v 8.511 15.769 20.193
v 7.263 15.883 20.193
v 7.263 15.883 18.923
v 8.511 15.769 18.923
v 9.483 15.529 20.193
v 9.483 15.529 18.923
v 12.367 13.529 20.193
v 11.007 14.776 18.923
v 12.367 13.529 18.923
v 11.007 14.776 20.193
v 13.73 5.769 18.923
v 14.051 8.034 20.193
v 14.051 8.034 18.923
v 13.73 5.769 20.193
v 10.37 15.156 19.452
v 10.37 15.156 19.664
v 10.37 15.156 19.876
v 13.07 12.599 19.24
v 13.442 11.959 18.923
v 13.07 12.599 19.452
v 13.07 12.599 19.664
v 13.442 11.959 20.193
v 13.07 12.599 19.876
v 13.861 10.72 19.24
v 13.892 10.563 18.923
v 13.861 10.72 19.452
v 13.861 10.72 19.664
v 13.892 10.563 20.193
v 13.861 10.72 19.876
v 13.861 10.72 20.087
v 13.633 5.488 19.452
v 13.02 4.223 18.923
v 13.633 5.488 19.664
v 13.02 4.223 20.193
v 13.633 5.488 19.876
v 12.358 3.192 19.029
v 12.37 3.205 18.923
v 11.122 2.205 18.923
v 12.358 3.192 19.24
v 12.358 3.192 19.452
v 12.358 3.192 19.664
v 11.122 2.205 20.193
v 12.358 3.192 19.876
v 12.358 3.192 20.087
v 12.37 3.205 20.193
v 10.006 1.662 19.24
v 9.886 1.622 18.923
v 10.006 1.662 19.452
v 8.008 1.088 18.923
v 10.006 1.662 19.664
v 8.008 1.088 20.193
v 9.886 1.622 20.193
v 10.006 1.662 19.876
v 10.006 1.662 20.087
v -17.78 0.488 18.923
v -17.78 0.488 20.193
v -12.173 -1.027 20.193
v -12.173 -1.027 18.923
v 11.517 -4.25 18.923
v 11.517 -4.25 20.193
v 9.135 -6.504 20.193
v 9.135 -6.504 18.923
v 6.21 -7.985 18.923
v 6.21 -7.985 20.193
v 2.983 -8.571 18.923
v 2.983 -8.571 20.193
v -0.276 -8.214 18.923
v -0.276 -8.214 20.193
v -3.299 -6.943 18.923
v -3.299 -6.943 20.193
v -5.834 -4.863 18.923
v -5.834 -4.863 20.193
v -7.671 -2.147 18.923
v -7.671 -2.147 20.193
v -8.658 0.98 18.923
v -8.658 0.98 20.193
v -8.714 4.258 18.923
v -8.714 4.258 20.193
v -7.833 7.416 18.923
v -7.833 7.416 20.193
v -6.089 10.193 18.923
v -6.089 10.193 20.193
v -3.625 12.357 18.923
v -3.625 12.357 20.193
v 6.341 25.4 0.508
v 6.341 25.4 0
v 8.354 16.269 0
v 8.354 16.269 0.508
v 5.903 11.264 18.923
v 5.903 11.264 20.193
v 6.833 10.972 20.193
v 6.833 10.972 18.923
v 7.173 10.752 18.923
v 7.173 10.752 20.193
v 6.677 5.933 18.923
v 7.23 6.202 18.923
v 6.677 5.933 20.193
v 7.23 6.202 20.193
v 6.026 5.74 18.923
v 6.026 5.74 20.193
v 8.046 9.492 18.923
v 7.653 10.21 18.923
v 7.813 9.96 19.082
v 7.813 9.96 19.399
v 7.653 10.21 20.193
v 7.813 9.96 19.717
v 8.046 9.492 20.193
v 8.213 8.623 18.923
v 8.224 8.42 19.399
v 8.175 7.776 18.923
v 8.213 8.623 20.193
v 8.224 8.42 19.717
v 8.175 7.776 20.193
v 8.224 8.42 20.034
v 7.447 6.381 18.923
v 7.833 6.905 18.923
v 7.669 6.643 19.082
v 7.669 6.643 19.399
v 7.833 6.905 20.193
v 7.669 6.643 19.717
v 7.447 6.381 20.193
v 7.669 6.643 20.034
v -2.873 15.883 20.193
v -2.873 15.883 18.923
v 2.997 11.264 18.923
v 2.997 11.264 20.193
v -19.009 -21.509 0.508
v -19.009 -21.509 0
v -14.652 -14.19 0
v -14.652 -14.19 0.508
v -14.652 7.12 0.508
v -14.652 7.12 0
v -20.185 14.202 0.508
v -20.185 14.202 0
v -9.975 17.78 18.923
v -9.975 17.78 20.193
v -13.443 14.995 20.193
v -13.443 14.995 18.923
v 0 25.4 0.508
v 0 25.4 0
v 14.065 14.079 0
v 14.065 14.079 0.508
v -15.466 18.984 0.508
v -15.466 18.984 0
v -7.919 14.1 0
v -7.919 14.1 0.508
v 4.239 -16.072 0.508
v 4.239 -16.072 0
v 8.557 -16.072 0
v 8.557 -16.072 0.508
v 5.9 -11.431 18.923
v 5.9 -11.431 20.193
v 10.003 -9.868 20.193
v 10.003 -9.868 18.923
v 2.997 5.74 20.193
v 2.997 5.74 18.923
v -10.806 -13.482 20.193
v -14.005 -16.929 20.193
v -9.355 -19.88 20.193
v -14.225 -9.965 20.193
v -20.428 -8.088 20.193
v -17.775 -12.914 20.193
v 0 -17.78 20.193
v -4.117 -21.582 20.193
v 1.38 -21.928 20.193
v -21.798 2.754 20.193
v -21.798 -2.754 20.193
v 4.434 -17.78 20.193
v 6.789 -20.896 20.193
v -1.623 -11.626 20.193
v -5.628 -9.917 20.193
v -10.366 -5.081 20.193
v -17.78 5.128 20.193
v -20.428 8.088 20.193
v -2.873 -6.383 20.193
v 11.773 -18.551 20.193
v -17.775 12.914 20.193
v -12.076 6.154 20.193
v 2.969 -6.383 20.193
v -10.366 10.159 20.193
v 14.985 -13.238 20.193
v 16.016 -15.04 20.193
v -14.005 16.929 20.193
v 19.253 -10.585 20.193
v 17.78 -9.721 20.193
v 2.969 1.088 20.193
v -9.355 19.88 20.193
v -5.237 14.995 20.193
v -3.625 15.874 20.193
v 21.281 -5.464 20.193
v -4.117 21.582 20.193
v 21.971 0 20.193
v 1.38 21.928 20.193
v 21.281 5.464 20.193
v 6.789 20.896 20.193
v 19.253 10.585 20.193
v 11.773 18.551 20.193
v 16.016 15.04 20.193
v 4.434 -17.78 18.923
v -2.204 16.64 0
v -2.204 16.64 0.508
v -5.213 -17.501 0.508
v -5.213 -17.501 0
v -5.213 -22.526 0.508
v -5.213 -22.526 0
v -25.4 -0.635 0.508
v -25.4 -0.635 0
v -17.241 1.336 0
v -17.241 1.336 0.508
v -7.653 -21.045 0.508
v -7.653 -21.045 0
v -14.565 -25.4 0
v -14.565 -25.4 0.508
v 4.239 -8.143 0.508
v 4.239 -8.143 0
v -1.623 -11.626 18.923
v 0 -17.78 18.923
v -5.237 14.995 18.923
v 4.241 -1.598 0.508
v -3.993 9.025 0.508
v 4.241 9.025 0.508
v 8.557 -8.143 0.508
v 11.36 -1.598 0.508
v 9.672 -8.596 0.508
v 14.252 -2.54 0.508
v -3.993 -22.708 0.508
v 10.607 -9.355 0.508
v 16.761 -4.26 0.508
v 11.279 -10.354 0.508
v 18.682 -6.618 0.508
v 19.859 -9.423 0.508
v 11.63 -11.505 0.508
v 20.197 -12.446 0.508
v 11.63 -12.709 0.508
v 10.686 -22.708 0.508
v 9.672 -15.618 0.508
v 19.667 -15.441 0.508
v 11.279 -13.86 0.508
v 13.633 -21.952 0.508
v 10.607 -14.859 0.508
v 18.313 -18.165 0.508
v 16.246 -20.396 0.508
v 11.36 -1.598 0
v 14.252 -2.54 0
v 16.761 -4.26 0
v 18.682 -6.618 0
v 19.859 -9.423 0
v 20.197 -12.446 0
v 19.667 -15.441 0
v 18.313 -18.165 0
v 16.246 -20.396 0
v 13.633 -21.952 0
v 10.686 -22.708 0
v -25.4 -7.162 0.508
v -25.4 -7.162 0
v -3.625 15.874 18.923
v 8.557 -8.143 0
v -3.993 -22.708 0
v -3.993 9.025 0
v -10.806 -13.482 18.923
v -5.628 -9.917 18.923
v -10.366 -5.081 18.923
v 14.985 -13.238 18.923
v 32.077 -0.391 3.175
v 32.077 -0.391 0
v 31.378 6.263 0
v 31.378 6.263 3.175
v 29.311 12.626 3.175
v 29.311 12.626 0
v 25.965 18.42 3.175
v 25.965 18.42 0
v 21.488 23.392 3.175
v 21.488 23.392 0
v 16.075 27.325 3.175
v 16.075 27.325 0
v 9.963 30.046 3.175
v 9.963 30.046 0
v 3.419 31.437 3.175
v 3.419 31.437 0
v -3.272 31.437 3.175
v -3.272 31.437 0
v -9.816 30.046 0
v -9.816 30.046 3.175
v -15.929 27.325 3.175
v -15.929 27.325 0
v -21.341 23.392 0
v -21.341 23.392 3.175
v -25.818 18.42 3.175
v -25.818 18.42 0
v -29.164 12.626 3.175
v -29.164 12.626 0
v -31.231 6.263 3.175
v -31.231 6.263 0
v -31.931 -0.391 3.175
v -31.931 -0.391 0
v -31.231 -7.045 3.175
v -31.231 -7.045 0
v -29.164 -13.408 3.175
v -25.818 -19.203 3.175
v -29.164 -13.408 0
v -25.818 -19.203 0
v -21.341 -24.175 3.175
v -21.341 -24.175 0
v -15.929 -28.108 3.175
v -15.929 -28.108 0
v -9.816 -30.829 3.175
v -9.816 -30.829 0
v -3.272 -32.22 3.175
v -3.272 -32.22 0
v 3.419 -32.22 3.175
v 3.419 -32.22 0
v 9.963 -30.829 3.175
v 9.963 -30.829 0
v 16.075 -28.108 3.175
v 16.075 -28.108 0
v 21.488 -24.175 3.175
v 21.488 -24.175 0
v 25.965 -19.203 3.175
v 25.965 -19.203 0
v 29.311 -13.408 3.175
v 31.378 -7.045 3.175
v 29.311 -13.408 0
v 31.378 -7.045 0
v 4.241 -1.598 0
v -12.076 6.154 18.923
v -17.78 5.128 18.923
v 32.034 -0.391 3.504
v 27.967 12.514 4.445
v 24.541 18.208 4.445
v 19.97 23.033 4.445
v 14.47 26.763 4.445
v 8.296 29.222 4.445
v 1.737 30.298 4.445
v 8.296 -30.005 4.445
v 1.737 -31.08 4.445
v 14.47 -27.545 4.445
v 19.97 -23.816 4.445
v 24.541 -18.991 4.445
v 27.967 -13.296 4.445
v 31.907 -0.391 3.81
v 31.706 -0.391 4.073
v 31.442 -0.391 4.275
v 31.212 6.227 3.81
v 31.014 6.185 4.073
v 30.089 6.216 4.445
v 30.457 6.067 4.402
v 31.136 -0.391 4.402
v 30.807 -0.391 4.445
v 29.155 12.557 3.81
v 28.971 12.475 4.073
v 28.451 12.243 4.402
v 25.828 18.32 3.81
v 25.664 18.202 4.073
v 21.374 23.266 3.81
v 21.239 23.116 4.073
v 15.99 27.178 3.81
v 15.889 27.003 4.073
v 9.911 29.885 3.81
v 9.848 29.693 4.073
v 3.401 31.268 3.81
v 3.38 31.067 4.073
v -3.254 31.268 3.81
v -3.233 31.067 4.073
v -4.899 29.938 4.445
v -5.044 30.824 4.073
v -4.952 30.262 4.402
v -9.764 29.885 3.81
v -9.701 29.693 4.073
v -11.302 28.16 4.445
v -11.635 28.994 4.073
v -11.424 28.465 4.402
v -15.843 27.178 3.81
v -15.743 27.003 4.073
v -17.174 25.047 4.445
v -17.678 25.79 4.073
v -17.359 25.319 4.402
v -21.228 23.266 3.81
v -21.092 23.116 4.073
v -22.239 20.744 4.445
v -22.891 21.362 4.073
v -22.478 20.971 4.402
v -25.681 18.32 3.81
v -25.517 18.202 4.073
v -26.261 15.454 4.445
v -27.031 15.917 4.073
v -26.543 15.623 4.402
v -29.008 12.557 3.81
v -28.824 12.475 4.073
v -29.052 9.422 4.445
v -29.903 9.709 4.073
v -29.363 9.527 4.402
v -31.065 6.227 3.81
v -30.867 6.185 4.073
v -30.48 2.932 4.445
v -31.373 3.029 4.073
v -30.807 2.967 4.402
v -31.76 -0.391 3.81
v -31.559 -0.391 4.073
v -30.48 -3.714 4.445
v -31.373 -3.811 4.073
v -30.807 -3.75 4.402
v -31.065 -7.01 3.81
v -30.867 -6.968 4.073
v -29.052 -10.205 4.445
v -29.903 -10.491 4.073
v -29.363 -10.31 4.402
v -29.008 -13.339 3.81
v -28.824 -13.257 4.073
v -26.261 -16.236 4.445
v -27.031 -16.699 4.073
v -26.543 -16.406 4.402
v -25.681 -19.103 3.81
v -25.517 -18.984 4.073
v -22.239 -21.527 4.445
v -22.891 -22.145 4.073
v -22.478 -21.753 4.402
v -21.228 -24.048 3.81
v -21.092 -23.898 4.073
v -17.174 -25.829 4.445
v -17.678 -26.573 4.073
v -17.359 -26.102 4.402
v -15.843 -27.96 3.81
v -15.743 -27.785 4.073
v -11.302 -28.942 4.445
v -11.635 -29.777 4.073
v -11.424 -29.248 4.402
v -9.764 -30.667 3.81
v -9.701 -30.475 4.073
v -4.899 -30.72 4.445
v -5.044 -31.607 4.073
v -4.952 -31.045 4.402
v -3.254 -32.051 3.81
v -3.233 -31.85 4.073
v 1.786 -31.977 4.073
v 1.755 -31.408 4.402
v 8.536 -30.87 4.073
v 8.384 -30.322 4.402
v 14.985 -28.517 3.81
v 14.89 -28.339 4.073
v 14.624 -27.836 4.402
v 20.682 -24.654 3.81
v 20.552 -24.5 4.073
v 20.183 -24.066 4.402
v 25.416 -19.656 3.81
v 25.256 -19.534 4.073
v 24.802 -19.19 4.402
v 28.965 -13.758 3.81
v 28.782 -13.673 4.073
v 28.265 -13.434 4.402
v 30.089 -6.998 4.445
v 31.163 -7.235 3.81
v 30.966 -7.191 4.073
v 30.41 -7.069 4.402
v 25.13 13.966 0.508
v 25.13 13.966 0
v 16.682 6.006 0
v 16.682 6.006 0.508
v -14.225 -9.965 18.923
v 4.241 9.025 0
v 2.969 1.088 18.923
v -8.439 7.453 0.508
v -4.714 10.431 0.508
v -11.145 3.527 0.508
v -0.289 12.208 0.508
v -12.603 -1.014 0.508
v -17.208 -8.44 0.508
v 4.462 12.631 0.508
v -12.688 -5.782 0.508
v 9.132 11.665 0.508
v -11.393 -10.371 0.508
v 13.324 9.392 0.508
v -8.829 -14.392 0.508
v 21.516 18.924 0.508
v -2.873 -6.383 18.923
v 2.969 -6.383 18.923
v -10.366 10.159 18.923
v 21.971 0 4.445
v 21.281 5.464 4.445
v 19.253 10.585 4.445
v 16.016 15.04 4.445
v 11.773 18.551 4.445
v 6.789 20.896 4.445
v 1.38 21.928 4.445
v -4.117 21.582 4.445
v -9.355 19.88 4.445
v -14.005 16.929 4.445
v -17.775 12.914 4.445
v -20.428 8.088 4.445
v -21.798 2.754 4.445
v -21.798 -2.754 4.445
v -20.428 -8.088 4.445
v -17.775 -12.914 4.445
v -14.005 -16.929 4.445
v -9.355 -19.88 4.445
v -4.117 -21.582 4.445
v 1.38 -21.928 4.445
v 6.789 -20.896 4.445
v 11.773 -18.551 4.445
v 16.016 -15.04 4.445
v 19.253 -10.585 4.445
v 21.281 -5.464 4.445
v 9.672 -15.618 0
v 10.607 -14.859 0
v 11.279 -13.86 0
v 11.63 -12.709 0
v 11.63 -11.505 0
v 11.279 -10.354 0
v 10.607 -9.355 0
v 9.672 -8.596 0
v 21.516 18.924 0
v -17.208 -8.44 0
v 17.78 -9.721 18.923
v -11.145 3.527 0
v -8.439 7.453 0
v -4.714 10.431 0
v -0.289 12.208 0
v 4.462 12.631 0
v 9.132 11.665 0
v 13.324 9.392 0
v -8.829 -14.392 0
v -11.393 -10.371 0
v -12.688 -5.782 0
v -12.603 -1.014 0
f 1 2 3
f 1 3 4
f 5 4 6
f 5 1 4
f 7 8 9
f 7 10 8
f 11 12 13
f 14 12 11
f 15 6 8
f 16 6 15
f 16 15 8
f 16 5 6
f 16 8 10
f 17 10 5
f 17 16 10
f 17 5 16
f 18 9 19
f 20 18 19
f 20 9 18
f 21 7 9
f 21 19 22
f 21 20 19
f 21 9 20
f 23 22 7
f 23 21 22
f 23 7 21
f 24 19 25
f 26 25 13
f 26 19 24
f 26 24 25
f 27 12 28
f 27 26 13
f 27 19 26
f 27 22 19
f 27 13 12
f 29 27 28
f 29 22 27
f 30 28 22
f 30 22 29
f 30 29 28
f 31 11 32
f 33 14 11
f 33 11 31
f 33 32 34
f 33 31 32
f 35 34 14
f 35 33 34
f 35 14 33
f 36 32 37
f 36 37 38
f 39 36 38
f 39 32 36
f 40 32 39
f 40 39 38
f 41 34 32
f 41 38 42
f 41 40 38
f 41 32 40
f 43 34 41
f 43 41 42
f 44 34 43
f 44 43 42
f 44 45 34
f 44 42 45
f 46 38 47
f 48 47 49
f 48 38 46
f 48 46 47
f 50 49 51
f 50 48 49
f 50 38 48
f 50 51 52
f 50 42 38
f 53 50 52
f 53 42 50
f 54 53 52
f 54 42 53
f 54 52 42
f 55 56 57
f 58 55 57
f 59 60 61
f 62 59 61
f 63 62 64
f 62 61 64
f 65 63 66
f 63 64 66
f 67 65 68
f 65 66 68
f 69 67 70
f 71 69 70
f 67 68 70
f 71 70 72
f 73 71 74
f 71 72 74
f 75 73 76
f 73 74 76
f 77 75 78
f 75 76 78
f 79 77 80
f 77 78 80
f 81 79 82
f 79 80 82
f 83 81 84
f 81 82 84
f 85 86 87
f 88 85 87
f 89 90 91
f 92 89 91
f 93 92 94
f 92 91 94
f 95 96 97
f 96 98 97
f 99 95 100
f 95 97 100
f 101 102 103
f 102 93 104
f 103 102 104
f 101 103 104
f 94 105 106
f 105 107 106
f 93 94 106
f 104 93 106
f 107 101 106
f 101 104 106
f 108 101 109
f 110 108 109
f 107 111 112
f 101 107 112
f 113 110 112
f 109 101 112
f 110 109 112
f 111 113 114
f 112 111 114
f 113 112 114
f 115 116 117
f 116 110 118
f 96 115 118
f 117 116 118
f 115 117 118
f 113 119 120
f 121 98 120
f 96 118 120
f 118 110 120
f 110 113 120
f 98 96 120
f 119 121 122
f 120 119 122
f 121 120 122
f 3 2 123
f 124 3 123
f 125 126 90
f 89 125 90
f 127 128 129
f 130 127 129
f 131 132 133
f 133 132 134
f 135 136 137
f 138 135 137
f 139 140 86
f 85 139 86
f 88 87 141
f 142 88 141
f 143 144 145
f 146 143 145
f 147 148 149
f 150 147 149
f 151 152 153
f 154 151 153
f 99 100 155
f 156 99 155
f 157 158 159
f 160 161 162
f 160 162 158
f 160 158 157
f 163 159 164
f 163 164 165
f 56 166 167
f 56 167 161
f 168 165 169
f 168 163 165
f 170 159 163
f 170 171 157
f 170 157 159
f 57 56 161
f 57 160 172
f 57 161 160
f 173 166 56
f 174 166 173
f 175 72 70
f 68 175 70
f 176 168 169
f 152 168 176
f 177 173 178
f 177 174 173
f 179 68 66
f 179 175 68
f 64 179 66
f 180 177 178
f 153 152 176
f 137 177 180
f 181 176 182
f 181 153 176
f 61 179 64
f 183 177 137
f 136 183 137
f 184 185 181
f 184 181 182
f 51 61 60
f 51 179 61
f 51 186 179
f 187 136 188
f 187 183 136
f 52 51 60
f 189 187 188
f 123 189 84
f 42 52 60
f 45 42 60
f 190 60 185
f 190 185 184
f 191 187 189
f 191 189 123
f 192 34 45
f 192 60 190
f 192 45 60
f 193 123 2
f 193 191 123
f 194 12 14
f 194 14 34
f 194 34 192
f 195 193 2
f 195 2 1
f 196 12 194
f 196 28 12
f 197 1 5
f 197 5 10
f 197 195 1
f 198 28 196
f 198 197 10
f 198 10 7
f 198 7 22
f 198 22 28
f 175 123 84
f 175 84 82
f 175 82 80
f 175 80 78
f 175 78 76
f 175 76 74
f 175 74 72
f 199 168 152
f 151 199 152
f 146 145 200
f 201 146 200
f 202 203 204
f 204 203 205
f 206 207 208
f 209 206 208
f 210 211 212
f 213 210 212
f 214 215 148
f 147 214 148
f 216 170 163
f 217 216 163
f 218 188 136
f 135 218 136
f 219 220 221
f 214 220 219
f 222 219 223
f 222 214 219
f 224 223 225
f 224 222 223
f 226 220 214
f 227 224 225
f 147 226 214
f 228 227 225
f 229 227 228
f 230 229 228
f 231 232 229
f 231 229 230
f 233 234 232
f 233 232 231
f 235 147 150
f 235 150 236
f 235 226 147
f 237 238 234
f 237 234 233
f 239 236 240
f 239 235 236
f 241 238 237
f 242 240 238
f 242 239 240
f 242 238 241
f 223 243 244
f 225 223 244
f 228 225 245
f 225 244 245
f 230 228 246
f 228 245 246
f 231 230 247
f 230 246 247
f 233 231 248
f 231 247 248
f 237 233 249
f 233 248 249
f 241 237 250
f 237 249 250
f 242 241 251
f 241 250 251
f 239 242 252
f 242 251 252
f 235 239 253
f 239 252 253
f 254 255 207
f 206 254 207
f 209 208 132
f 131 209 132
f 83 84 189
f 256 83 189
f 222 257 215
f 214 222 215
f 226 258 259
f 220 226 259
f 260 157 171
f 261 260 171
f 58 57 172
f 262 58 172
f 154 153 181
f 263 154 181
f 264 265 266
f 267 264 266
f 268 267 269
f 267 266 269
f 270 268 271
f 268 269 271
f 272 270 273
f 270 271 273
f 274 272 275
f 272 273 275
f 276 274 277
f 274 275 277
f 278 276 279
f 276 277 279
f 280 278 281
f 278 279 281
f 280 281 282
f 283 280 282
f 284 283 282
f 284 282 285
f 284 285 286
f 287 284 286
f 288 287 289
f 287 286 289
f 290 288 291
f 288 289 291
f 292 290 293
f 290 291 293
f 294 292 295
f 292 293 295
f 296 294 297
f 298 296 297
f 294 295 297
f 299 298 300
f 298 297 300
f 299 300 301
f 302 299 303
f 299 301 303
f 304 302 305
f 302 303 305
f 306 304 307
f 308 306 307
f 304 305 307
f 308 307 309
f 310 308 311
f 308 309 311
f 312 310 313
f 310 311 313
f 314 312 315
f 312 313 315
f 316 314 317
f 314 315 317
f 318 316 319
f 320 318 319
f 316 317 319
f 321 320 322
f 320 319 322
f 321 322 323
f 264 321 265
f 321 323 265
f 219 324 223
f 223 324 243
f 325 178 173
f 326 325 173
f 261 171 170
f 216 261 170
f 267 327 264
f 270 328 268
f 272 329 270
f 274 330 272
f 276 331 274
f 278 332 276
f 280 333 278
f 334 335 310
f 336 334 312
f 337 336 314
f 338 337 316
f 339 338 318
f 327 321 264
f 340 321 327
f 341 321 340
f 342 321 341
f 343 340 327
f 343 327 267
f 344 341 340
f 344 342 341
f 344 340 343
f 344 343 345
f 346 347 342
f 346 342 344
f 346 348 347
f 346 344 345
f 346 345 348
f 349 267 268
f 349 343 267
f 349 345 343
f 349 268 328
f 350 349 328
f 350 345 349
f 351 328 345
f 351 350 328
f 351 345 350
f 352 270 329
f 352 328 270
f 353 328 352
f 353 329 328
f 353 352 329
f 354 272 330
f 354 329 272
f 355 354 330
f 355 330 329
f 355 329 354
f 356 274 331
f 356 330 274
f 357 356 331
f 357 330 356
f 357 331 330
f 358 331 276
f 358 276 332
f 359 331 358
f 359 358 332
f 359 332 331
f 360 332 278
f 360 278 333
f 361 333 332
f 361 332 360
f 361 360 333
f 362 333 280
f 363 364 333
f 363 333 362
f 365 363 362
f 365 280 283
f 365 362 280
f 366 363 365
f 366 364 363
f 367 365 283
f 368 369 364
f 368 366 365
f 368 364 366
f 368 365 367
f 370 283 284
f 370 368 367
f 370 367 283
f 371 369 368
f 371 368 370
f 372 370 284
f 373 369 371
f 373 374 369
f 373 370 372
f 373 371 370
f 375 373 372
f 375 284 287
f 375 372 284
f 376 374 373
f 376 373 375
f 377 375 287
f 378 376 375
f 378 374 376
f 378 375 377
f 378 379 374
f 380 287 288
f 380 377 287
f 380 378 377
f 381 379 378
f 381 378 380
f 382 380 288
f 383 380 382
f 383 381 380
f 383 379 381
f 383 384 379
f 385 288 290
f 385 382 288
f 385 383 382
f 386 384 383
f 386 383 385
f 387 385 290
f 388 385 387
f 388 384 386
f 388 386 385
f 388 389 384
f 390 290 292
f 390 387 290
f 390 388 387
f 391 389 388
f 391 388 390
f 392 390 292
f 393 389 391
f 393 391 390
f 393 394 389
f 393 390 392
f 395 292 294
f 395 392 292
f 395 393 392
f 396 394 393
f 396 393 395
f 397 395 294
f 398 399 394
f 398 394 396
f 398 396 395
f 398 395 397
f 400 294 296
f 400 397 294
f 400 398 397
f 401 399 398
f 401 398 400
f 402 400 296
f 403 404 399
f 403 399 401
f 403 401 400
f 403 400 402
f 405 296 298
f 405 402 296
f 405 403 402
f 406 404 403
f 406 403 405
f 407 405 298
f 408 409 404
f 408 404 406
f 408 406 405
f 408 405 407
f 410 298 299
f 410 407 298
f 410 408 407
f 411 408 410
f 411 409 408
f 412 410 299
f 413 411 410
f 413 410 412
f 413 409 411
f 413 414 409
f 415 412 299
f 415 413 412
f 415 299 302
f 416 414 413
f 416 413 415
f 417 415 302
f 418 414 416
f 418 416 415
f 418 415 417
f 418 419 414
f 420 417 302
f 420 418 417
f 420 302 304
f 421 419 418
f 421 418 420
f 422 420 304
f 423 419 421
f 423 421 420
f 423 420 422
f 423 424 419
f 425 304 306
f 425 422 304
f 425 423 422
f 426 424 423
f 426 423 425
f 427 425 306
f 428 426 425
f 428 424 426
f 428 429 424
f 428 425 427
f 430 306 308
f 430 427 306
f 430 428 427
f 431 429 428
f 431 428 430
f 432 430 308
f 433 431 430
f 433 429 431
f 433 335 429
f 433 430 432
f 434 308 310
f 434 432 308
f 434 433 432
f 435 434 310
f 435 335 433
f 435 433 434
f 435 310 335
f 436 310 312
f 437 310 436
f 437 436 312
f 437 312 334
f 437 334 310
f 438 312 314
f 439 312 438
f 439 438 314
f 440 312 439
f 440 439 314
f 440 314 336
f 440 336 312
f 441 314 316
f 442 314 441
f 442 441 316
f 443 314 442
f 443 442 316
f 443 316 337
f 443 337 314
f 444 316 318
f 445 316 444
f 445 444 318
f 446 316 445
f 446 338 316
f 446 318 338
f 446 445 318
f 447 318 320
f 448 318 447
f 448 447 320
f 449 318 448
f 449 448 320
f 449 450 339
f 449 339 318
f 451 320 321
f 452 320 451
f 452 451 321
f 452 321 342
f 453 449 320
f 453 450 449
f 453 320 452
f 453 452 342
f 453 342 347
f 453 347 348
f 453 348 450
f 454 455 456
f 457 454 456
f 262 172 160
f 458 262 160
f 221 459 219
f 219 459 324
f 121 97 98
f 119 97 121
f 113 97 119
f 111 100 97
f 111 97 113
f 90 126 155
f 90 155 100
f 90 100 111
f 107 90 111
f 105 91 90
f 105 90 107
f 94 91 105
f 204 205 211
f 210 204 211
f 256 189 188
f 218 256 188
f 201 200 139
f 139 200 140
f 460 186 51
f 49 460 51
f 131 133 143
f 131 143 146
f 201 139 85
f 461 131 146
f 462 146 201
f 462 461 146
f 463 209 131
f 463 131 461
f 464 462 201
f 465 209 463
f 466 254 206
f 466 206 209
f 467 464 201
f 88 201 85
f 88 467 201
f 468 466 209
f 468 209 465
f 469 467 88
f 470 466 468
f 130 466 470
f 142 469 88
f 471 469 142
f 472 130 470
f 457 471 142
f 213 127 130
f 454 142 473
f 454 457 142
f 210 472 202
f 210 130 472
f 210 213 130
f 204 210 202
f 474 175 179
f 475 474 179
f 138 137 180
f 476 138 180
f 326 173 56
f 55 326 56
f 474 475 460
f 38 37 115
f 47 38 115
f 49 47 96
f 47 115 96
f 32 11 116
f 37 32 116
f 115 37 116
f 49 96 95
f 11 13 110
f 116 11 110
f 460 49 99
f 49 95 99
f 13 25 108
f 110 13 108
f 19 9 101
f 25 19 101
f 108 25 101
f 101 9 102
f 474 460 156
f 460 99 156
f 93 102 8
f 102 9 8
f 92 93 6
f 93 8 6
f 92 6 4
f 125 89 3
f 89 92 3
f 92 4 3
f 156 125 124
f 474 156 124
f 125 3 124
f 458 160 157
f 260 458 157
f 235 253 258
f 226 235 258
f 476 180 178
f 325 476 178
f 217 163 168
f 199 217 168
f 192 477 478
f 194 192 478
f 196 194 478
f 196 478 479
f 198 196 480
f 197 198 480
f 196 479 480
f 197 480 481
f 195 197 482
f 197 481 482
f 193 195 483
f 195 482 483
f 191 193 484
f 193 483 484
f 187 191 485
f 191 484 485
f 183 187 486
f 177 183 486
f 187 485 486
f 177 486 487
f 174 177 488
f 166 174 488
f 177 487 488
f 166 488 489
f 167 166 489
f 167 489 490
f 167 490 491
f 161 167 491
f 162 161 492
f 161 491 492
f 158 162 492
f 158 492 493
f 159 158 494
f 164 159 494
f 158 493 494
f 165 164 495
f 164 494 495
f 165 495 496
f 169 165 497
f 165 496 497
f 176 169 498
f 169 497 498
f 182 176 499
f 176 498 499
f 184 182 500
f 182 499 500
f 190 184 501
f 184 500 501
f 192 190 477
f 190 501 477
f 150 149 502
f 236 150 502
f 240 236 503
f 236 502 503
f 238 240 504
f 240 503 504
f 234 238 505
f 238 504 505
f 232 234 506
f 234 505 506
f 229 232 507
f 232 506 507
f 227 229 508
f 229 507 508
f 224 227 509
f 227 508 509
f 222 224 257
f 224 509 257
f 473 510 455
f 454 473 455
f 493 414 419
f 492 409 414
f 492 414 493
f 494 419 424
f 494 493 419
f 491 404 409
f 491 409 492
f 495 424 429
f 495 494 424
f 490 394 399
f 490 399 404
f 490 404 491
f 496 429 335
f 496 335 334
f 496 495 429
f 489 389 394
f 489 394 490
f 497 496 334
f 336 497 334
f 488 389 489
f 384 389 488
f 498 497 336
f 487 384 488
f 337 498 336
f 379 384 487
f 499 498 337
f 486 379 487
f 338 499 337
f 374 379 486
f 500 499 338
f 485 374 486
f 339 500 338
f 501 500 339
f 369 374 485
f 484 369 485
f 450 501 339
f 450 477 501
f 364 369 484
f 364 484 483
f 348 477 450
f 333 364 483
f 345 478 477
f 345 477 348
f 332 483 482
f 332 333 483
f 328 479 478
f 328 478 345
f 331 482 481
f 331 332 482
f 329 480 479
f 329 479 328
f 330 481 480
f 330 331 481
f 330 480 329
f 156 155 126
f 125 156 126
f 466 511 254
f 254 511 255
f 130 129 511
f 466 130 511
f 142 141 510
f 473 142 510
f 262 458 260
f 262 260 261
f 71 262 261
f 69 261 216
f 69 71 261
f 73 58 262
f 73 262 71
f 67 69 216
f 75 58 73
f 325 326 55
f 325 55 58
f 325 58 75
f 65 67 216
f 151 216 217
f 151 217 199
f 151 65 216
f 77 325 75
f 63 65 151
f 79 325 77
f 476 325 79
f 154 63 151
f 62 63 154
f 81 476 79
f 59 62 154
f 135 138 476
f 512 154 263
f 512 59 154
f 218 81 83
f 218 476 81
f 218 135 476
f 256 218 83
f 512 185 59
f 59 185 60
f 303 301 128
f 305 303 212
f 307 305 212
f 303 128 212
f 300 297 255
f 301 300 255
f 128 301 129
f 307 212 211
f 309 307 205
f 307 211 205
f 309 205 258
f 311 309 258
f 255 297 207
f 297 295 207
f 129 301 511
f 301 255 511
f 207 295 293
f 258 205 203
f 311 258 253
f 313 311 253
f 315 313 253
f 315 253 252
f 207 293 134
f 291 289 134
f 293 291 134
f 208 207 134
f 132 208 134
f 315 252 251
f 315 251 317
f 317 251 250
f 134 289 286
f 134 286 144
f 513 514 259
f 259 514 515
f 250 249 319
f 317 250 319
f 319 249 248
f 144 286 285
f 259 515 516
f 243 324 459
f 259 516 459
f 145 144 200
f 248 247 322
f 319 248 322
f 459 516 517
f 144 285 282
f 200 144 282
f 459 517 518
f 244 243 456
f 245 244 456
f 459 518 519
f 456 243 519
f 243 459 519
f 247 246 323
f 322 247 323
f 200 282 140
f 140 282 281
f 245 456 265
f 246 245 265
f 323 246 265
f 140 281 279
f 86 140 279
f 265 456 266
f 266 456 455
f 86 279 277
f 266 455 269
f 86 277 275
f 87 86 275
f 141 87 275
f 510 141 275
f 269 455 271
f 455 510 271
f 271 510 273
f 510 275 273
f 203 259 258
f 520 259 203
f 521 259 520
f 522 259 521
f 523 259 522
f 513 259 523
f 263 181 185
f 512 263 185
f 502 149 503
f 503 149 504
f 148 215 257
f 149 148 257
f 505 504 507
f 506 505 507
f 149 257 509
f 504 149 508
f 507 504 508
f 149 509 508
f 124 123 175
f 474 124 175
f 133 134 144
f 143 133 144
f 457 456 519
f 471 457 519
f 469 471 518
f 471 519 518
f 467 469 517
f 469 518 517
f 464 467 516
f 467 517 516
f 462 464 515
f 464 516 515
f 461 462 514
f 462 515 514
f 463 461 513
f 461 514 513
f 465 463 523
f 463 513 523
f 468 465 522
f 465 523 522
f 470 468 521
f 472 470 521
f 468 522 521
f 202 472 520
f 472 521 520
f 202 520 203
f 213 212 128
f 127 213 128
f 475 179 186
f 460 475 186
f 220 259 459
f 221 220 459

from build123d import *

# Parameters (mm, degrees)
F0_R     = 32.004
F1_DEPTH = 4.445
F2_R     = 21.971
F3_DEPTH = 15.748
F4_R     = 1.27
F6_DEPTH = 1.27
F8_DEPTH = 0.508


with BuildPart() as f1:
    # F0 (on Top) → F1 (new body)
    with BuildSketch(Plane.XY):
        with Locations((0.0734815403, -0.3912560351)):
            Circle(F0_R)
    extrude(amount=F1_DEPTH)

    # F2 (on face) → F3 (join)
    with BuildSketch(Plane.XY.offset(4.445)):
        Circle(F2_R)
    extrude(amount=F3_DEPTH)

    # F4
    f4_edges = [f1.edges().sort_by_distance(p)[0] for p in [
        (-31.930518, -0.391256, 4.445),
    ]]
    fillet(f4_edges, radius=F4_R)

    # F5 (on face) → F6 (cut)
    with BuildSketch(Plane.XY.offset(20.193)):
        with BuildLine():
            ThreePointArc((11.5169007331, -4.2504528537), (-5.8335664103, -4.8630391768), (-3.625406418, 12.3572396114))
            Line((-3.625406418, 12.3572396114), (-3.625406418, 15.8741623163))
            Line((-3.625406418, 15.8741623163), (-5.2373292856, 14.9949323386))
            Line((-5.2373292856, 14.9949323386), (-9.9754063413, 17.78))
            Line((-9.9754063413, 17.78), (-13.4434830397, 14.9949323386))
            Line((-13.4434830397, 14.9949323386), (-10.3661753237, 10.1591628045))
            Line((-10.3661753237, 10.1591628045), (-12.0757911354, 6.153778173))
            Line((-12.0757911354, 6.153778173), (-17.78, 5.1280092448))
            Line((-17.78, 5.1280092448), (-17.78, 0.4876240855))
            Line((-17.78, 0.4876240855), (-12.1734831482, -1.0266067693))
            Line((-12.1734831482, -1.0266067693), (-10.3661753237, -5.0808377564))
            Line((-10.3661753237, -5.0808377564), (-14.225021936, -9.9654532969))
            Line((-14.225021936, -9.9654532969), (-10.8057912439, -13.4823769331))
            Line((-10.8057912439, -13.4823769331), (-5.6280987337, -9.9166072905))
            Line((-5.6280987337, -9.9166072905), (-1.6227141023, -11.6262231022))
            Line((-1.6227141023, -11.6262231022), (0, -17.78))
            Line((0, -17.78), (4.4342088513, -17.78))
            Line((4.4342088513, -17.78), (5.8995936997, -11.4308381453))
            Line((5.8995936997, -11.4308381453), (10.0026708096, -9.8677603528))
            Line((10.0026708096, -9.8677603528), (14.9849783629, -13.2381459698))
            Line((14.9849783629, -13.2381459698), (17.78, -9.7212223336))
            Line((17.78, -9.7212223336), (11.5169007331, -4.2504528537))
        make_face()
        with BuildLine():
            add(Edge.make_bspline(
                [(7.2628180496, 15.8830489963), (7.764120513, 15.8547054313), (8.7931376229, 15.7965249604), (10.4249300167, 15.2148196487), (11.8099126054, 14.2323930058), (13.1704291206, 12.5947806565), (14.0438131033, 10.7817202185), (14.1201673867, 7.3393260802), (13.7194691328, 5.5139226252), (13.0765966002, 4.3745110609), (12.4961633849, 3.1101795931), (10.8585799754, 2.0034232369), (10.0201954446, 1.6327368317), (8.7603057074, 1.291574238), (8.0080404878, 1.0878700996)],
                knots=[0, 0, 0, 0, 0.0772193353, 0.1585071351, 0.2400871058, 0.3296102404, 0.4189216979, 0.5342087706, 0.6199032215, 0.6892989221, 0.7632939871, 0.8489473746, 0.9098082689, 1, 1, 1, 1], degree=3))
            Line((7.2628180496, 15.8830489963), (-2.8727587778, 15.8830489963))
            Line((-2.8727587778, 15.8830489963), (-2.8727587778, -6.3826409169))
            Line((-2.8727587778, -6.3826409169), (2.9688859358, -6.3826409169))
            Line((2.9688859358, -6.3826409169), (2.9688859358, 1.0878700996))
            Line((2.9688859358, 1.0878700996), (8.0080404878, 1.0878700996))
        make_face()
        with BuildLine():
            Line((2.9969443567, 11.2640913576), (5.9029692784, 11.2640913576))
            add(Edge.make_bspline(
                [(5.9029692784, 11.2640913576), (6.311247704, 11.169172309), (7.117729351, 10.9816765566), (7.8395571972, 9.97335199), (8.1597875123, 9.2817549766), (8.2415328063, 8.4012900963), (8.2114096294, 7.6759192789), (7.7218664719, 6.5872887351), (7.0554159923, 6.0180518678), (6.3806756136, 5.8354795836), (6.0261930339, 5.7395631447)],
                knots=[0, 0, 0, 0, 0.14072062, 0.2779686368, 0.3897367685, 0.5061439342, 0.6157367861, 0.751736381, 0.8695718667, 1, 1, 1, 1], degree=3))
            Line((6.0261930339, 5.7395631447), (2.9969443567, 5.7395631447))
            Line((2.9969443567, 5.7395631447), (2.9969443567, 11.2640913576))
        make_face(mode=Mode.SUBTRACT)
    extrude(amount=-F6_DEPTH, mode=Mode.SUBTRACT)

    # F7 (on face) → F8 (cut)
    with BuildSketch(Plane(origin=(0, 0, 0), x_dir=(1, 0, 0), z_dir=(0, 0, -1))):
        with BuildLine():
            ThreePointArc((11.3601768389, 1.597710303), (20.1967129552, 12.4455869556), (10.6863165274, 22.7078069001))
            Line((10.6863165274, 22.7078069001), (-3.9929486811, 22.7078069001))
            Line((-3.9929486811, 22.7078069001), (-3.9929486811, -9.0245176107))
            Line((-3.9929486811, -9.0245176107), (4.2410902679, -9.0245176107))
            Line((4.2410902679, -9.0245176107), (4.2410902679, 1.597710303))
            Line((4.2410902679, 1.597710303), (11.3601768389, 1.597710303))
        make_face()
        with BuildLine():
            Line((4.2392467149, 16.0716325045), (8.5572467149, 16.0716325045))
            ThreePointArc((8.5572467149, 16.0716325045), (11.67463885, 12.1071133763), (8.5572467149, 8.1425942481))
            Line((8.5572467149, 8.1425942481), (4.2392467149, 8.1425942481))
            Line((4.2392467149, 8.1425942481), (4.2392467149, 16.0716325045))
        make_face(mode=Mode.SUBTRACT)
        with BuildLine():
            ThreePointArc((16.6819114238, -6.0063162819), (-8.4387461135, -7.4533040262), (-5.2131637931, 17.5013914704))
            Line((-5.2131637931, 17.5013914704), (-5.2131637931, 22.5260201842))
            Line((-5.2131637931, 22.5260201842), (-7.6528675854, 21.0447721183))
            Line((-7.6528675854, 21.0447721183), (-14.565362595, 25.4))
            Line((-14.565362595, 25.4), (-19.0091095865, 21.5094778687))
            Line((-19.0091095865, 21.5094778687), (-14.6524952725, 14.190364629))
            Line((-14.6524952725, 14.190364629), (-17.2083750367, 8.4396339953))
            Line((-17.2083750367, 8.4396339953), (-25.4, 7.1616931818))
            Line((-25.4, 7.1616931818), (-25.4, 0.6350930198))
            Line((-25.4, 0.6350930198), (-17.2410104424, -1.336485846))
            Line((-17.2410104424, -1.336485846), (-14.6524952725, -7.1198018268))
            Line((-14.6524952725, -7.1198018268), (-20.1845727861, -14.2024941742))
            Line((-20.1845727861, -14.2024941742), (-15.4662290588, -18.9843121916))
            Line((-15.4662290588, -18.9843121916), (-7.9194987193, -14.0996957198))
            Line((-7.9194987193, -14.0996957198), (-2.2044987418, -16.6396964341))
            Line((-2.2044987418, -16.6396964341), (0, -25.4))
            Line((0, -25.4), (6.3412087038, -25.4))
            Line((6.3412087038, -25.4), (8.3538619801, -16.2688288838))
            Line((8.3538619801, -16.2688288838), (14.0649145469, -14.0794068575))
            Line((14.0649145469, -14.0794068575), (21.5155947953, -18.9242325723))
            Line((21.5155947953, -18.9242325723), (25.1302085817, -13.9663480222))
            Line((25.1302085817, -13.9663480222), (16.6819114238, -6.0063162819))
        make_face()
    extrude(amount=-F8_DEPTH, mode=Mode.SUBTRACT)


solid = f1.part
